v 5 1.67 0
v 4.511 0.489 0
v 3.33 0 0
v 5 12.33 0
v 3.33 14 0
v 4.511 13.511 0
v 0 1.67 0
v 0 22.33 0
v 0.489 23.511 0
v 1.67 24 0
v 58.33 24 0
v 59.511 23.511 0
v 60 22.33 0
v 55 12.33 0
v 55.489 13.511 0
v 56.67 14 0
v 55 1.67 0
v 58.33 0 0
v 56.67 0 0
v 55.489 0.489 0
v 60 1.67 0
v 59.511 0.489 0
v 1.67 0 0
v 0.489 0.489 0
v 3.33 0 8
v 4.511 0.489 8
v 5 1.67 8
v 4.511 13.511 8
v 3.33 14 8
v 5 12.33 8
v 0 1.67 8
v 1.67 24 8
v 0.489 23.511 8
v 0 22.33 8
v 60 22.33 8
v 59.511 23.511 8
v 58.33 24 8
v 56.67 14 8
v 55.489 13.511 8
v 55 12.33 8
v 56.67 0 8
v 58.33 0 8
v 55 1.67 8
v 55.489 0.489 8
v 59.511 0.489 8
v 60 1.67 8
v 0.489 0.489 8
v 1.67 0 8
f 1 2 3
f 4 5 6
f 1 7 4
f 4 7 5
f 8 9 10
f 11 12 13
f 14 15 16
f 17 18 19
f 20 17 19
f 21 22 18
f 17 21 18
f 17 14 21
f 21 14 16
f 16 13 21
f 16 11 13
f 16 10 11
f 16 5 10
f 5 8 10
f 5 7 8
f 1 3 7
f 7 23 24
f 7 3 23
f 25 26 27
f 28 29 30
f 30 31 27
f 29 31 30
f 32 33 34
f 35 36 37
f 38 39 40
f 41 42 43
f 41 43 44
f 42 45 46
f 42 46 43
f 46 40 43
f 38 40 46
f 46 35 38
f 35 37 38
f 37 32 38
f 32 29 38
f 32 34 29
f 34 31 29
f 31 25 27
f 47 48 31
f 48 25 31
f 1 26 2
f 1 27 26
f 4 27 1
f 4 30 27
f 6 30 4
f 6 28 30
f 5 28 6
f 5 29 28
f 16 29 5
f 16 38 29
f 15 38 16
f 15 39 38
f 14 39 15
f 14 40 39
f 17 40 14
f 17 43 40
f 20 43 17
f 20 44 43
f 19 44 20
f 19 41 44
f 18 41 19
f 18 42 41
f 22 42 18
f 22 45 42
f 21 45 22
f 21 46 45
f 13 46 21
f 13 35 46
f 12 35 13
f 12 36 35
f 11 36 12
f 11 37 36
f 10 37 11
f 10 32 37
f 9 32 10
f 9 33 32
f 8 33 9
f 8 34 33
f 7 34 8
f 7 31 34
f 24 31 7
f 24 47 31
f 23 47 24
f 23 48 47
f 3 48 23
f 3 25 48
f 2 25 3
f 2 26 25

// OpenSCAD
$fn = 32;

// ----------------------------------------------------------------------
// Clip blank: staple clip, 8 mm thick
// ----------------------------------------------------------------------

// --- parameters (mm) ---
profile_height = 8;       // extrusion height
profile_points = 24;      // points of the closed outline

profile = [[0, 1.67], [0.489, 0.489], [1.67, 0], [3.33, 0], [4.511, 0.489], [5, 1.67], [5, 12.33], [4.511, 13.511], [3.33, 14], [56.67, 14], [55.489, 13.511], [55, 12.33], [55, 1.67], [55.489, 0.489], [56.67, 0], [58.33, 0], [59.511, 0.489], [60, 1.67], [60, 22.33], [59.511, 23.511], [58.33, 24], [1.67, 24], [0.489, 23.511], [0, 22.33]];  // single closed polygon, 24 points, counter clockwise

// --- the one profile operation ---
linear_extrude(height = profile_height) polygon(points = profile);
